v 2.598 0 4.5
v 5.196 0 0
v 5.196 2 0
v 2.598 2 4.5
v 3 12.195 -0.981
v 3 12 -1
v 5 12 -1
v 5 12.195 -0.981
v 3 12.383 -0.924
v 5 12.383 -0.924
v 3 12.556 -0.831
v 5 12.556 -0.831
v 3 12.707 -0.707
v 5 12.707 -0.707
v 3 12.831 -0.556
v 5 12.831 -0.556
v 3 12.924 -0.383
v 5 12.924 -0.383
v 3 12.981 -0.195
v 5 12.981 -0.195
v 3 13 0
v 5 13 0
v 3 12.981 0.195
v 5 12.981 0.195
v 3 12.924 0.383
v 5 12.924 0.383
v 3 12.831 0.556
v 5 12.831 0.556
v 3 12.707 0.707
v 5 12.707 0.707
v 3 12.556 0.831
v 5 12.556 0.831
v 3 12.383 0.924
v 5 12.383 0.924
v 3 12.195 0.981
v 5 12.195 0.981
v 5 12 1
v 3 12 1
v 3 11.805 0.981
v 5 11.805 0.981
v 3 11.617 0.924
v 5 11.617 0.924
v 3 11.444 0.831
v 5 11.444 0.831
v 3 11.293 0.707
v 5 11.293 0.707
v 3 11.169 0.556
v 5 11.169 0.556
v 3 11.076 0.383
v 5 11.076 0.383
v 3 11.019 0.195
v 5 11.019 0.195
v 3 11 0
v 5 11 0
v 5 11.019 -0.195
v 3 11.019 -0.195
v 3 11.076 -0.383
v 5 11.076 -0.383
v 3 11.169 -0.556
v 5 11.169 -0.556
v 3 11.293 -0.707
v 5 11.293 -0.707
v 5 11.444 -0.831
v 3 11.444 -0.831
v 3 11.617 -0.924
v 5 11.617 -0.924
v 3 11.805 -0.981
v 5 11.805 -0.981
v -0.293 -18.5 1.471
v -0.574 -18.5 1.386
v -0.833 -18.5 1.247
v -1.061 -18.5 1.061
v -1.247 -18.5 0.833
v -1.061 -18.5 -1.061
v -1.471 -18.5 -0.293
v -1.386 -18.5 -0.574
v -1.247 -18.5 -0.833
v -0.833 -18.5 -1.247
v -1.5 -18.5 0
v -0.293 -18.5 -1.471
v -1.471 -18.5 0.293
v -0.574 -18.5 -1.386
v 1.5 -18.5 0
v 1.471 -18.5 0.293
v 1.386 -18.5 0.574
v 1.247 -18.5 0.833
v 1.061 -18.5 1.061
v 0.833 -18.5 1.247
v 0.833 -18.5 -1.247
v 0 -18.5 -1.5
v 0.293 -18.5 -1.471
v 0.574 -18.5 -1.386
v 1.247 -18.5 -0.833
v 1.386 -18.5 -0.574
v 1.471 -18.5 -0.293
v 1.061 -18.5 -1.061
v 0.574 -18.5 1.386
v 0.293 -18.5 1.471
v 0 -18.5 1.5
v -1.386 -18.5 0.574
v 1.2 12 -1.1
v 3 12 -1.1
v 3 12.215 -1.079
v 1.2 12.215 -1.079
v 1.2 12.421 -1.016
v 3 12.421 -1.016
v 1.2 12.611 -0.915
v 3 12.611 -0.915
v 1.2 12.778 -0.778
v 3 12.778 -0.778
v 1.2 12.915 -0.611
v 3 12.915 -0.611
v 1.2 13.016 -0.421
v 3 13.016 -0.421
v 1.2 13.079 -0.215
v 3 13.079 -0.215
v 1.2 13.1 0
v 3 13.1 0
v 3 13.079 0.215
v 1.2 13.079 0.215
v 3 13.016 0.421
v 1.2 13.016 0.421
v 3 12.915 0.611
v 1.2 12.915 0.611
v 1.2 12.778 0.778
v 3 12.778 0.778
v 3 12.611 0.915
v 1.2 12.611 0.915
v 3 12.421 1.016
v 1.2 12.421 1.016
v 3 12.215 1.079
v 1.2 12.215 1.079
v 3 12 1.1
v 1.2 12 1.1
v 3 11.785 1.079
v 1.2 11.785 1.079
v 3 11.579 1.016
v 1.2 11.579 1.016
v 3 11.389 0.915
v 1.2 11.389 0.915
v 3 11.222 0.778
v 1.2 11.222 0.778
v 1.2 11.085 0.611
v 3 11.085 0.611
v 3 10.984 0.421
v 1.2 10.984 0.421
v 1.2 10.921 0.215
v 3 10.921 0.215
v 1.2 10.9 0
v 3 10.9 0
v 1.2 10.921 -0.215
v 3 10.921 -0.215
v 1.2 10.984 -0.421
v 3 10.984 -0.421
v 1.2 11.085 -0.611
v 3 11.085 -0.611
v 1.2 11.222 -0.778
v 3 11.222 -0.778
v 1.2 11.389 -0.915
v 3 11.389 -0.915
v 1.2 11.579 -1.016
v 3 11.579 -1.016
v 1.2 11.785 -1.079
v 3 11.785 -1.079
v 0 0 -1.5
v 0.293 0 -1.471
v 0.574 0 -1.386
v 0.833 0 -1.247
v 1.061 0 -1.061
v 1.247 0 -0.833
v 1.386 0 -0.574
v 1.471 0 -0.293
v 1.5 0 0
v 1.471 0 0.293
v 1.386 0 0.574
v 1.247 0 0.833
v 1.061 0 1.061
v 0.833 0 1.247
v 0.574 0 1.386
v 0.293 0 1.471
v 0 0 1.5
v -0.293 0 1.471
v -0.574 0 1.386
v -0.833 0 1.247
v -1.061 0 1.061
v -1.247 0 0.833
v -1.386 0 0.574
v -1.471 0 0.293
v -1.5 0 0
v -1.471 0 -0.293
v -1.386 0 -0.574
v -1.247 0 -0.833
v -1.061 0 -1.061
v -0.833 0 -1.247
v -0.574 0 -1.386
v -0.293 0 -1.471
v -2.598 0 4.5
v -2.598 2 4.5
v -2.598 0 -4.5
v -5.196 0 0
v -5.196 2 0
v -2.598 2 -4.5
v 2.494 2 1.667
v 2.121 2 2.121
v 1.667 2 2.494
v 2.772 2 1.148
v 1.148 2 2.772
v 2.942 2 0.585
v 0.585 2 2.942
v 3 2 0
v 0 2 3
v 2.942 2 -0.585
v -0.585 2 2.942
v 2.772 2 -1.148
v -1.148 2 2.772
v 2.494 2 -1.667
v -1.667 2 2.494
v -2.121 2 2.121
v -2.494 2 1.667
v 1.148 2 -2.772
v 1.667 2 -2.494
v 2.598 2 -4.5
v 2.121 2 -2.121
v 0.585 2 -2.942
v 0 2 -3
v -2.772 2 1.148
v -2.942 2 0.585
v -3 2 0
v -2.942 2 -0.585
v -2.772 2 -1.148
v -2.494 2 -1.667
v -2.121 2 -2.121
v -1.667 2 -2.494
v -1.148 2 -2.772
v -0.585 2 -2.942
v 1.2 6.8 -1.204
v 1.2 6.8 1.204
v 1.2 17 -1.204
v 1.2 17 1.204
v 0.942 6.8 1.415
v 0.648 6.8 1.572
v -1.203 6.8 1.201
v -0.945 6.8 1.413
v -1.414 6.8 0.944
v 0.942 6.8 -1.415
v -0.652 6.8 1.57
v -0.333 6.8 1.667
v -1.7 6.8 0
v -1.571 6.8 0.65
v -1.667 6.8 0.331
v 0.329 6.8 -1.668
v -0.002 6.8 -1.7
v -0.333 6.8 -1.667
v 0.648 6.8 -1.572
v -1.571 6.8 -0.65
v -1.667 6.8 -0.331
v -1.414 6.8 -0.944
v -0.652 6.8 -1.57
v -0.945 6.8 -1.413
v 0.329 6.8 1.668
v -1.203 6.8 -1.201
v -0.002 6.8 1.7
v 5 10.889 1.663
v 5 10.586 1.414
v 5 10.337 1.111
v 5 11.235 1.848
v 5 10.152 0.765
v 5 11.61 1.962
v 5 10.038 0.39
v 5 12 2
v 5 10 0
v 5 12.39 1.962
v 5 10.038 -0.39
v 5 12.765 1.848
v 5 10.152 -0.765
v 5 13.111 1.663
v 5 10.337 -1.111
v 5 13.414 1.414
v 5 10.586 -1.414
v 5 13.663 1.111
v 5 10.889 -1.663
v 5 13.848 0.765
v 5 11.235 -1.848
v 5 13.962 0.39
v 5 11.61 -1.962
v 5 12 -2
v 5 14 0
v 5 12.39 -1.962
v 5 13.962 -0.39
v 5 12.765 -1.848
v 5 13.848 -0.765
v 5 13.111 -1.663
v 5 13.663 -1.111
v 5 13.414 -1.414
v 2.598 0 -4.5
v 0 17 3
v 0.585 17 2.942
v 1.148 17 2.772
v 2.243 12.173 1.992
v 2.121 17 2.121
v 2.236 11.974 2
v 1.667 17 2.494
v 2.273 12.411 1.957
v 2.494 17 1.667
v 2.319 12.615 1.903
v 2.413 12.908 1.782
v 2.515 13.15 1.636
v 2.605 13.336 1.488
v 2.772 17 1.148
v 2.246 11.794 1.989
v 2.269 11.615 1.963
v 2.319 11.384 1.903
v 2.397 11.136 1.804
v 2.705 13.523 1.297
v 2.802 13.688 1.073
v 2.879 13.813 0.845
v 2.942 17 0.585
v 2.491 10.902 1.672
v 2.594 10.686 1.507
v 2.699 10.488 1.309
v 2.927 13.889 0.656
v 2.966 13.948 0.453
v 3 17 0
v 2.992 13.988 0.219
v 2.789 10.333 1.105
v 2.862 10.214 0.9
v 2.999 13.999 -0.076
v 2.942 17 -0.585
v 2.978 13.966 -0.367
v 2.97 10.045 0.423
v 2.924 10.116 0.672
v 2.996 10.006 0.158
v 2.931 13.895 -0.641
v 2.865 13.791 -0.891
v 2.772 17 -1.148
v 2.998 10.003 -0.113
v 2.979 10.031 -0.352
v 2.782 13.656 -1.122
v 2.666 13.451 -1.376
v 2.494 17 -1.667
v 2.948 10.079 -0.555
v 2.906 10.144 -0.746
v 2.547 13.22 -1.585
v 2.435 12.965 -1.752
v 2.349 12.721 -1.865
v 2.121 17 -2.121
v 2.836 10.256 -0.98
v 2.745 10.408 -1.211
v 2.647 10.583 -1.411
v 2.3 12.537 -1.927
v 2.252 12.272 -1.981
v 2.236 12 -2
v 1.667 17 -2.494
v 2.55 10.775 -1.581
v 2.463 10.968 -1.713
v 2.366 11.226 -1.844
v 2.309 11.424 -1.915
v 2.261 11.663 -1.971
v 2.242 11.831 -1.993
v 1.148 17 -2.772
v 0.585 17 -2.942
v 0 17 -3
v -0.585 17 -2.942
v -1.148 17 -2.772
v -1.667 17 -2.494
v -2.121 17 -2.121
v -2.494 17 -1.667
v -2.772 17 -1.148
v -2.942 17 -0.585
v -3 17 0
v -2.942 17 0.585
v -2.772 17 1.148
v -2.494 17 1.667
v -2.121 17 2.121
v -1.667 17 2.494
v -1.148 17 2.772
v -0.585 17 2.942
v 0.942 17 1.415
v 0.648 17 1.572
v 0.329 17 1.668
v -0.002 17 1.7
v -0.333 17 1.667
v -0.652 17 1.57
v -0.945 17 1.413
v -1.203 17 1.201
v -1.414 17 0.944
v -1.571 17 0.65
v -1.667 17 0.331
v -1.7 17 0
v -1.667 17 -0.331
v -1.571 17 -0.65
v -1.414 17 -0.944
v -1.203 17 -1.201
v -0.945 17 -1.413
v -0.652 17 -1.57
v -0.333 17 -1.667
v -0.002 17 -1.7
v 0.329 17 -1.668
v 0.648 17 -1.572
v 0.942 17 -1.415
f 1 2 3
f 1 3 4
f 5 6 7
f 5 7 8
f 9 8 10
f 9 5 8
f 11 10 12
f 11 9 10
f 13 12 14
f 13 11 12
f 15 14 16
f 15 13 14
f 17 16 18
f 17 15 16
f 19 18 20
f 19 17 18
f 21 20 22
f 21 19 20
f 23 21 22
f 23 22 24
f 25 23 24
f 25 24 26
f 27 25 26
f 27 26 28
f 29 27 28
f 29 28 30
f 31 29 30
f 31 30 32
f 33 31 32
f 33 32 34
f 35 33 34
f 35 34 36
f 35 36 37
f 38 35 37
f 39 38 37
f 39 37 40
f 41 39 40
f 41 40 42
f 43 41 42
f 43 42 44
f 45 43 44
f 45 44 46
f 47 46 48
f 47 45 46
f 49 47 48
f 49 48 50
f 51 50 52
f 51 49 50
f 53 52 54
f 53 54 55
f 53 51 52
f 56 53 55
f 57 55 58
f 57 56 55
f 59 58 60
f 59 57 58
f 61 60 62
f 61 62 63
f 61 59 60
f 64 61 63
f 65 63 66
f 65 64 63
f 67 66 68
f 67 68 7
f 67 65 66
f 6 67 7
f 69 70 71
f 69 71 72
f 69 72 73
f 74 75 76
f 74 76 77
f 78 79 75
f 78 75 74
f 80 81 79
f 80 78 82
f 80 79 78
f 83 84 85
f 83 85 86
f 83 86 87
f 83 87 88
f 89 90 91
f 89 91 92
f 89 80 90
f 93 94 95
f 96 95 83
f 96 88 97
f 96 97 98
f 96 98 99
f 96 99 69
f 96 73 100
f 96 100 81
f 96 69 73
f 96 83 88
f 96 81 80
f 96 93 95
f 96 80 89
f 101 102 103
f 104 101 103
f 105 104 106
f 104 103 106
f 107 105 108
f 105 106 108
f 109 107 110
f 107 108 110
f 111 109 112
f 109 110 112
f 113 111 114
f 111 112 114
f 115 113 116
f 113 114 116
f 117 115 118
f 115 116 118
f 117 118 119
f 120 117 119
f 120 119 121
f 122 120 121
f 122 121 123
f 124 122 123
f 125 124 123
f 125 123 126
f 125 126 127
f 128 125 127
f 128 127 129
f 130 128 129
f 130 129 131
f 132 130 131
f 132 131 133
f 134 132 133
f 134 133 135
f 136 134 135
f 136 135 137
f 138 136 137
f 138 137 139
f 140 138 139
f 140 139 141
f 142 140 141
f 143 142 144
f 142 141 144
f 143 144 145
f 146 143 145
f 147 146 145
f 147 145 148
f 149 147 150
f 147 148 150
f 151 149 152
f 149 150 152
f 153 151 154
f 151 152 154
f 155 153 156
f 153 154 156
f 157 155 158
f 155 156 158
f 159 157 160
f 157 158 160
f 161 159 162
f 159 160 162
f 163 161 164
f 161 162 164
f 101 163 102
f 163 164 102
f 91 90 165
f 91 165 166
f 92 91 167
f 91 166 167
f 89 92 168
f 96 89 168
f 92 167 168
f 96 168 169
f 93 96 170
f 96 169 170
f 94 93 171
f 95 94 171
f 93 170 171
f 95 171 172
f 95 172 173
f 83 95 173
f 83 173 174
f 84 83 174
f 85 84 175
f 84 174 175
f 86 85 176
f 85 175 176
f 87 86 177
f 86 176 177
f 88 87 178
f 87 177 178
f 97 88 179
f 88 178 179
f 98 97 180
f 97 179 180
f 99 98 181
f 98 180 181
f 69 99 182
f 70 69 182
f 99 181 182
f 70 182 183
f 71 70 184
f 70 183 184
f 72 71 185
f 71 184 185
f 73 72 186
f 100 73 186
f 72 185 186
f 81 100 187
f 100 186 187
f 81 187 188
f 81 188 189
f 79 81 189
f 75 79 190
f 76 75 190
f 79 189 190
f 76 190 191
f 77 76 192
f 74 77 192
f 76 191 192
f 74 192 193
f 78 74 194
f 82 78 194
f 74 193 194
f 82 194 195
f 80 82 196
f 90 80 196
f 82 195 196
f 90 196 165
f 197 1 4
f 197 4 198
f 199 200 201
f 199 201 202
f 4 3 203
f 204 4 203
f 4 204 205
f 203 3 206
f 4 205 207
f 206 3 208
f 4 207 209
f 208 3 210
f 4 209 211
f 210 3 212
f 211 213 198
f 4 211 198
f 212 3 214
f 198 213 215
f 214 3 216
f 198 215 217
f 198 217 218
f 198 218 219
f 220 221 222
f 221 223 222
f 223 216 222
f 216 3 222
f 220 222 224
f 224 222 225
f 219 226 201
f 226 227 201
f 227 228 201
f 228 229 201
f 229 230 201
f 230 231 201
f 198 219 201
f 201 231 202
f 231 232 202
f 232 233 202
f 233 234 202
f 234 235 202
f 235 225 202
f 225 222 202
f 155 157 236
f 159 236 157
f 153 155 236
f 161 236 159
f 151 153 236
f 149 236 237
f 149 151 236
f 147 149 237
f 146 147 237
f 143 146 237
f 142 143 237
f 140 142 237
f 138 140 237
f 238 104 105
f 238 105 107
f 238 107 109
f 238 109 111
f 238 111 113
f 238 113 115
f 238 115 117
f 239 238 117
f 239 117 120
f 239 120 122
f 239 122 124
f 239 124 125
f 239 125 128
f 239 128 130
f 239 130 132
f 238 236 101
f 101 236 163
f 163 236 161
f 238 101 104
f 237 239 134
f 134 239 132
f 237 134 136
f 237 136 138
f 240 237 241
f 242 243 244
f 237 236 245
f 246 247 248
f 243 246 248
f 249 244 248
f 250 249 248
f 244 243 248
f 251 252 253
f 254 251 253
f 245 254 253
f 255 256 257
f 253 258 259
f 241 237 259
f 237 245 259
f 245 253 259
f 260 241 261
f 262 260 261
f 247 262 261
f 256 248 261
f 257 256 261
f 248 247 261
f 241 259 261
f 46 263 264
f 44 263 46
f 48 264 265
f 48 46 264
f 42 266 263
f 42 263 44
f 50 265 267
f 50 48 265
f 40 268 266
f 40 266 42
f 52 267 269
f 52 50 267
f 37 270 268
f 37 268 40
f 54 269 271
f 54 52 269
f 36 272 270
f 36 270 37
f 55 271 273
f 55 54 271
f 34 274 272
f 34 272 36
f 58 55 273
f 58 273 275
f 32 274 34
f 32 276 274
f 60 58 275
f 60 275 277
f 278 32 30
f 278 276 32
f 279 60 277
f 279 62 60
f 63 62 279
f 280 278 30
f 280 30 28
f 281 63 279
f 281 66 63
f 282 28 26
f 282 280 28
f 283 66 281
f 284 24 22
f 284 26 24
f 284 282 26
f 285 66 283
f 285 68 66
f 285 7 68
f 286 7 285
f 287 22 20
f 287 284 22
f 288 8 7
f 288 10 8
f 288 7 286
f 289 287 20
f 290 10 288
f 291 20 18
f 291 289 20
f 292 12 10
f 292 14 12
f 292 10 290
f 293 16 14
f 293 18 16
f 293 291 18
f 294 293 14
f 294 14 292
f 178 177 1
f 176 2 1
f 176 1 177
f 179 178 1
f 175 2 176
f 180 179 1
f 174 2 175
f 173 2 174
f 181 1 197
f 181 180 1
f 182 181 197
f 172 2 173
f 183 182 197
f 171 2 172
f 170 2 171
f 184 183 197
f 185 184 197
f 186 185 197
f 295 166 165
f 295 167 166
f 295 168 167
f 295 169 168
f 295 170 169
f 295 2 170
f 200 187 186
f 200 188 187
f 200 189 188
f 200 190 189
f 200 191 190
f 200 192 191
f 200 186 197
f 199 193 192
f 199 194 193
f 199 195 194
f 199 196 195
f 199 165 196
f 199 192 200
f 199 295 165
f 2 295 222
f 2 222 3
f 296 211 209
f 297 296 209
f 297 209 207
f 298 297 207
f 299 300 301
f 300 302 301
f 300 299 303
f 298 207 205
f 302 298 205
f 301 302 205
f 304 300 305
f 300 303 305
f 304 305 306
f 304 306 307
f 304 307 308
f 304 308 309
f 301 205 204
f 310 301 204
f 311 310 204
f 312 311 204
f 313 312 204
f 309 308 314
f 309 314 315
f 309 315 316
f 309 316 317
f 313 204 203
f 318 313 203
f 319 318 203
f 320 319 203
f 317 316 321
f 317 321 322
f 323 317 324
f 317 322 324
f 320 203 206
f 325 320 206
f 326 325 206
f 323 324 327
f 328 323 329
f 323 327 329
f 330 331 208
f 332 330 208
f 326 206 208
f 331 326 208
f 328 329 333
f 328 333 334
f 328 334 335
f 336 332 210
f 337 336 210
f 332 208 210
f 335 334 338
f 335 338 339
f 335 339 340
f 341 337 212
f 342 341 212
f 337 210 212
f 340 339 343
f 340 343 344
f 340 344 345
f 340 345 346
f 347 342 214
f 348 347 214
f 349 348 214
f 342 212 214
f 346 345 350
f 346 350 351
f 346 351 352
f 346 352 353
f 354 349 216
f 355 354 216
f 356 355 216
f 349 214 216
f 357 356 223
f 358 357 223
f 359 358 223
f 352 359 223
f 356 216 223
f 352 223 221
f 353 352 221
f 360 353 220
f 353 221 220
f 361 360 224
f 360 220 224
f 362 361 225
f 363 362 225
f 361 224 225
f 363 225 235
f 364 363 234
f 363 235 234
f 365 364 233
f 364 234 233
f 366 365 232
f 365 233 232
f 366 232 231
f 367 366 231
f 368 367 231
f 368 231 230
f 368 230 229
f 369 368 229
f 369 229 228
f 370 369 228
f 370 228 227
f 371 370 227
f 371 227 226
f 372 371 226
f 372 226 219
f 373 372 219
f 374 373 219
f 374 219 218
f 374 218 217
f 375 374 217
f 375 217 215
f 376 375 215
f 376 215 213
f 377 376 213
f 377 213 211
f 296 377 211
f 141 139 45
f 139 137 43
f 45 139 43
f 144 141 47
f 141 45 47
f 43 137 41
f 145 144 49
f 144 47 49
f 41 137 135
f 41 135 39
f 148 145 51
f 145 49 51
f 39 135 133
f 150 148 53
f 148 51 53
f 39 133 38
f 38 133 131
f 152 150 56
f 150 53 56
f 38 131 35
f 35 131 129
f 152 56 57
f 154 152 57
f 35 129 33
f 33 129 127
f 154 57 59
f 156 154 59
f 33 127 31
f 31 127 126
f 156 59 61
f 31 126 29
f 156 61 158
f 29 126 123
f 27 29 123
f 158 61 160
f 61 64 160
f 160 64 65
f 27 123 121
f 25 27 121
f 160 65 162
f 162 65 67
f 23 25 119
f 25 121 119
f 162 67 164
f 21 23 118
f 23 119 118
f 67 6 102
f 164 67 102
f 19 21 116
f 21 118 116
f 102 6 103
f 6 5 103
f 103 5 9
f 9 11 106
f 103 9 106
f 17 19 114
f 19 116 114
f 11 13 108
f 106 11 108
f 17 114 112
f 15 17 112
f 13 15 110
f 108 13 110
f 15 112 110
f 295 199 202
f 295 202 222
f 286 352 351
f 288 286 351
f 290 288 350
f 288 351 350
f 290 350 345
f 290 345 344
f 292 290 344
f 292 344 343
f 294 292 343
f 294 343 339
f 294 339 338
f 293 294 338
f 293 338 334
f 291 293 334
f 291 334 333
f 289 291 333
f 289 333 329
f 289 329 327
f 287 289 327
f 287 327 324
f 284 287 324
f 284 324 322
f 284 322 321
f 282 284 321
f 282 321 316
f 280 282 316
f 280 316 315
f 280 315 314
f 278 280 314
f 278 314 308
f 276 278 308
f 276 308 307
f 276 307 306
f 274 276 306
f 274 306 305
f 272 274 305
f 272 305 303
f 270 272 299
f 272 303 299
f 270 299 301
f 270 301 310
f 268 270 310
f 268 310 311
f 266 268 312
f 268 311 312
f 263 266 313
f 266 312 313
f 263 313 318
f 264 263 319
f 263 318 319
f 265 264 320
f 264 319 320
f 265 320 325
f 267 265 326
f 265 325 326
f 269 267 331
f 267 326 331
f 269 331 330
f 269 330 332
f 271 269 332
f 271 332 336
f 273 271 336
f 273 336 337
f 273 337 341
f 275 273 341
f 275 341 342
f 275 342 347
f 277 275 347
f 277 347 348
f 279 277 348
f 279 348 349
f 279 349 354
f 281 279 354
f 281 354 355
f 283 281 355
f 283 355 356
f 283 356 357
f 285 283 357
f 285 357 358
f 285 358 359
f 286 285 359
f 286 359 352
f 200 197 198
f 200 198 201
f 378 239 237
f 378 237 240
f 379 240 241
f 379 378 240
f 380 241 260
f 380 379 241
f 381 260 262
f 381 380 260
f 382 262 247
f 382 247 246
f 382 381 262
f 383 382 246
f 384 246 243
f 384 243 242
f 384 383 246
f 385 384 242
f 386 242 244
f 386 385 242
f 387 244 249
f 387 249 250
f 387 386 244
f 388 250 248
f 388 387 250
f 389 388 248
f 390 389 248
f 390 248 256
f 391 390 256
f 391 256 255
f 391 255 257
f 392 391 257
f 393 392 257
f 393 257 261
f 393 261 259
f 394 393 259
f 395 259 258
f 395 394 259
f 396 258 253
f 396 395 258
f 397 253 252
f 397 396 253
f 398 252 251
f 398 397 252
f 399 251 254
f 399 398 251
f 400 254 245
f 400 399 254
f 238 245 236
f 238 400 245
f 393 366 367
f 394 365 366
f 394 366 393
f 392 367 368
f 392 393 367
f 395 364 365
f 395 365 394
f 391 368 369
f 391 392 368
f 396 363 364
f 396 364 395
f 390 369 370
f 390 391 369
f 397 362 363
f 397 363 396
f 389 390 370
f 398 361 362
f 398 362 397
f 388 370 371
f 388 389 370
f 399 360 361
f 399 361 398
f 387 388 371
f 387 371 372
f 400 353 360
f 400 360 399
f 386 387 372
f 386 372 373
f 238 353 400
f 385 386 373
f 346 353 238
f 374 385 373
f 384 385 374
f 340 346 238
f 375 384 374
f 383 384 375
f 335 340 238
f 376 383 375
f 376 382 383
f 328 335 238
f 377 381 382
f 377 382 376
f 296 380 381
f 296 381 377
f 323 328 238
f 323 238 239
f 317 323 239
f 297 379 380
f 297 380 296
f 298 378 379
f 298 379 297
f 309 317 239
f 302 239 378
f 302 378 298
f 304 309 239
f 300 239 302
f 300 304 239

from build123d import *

# Parameters (mm, degrees)
SKETCH1_R                = 3
BOSS_EXTRUDE1_DEPTH      = 17
CUT_EXTRUDE3_DEPTH       = 10.2
BOSS_EXTRUDE2_DEPTH      = 2
SKETCH4_R                = 1.5
BOSS_EXTRUDE3_DEPTH      = 18.5
BOSS_EXTRUDE4_DEPTH      = 2
BOSS_EXTRUDE4_DEPTH_BACK = 1
SKETCH6_R                = 2
SKETCH6_R_2              = 1
SKETCH7_R                = 1.1
CUT_EXTRUDE4_DEPTH       = 3


with BuildPart() as part:
    # Sketch1 → Boss-Extrude1 (new body)
    with BuildSketch(Plane(origin=(0, 0, 0), x_dir=(1, 0, 0), z_dir=(0, 1, 0))):
        with Locations(Location((0, 0, 0), (0, 0, 270))):
            Circle(SKETCH1_R)
    extrude(amount=BOSS_EXTRUDE1_DEPTH)

    # Sketch2 → Cut-Extrude3 (cut)
    with BuildSketch(Plane(origin=(0, 17, 0), x_dir=(1, 0, 0), z_dir=(0, 1, 0))):
        with BuildLine():
            Line((1.2, 1.204159458), (1.2, -1.204159458))
            ThreePointArc((1.2, -1.204159458), (-1.7, 0), (1.2, 1.204159458))
        make_face()
    extrude(amount=-CUT_EXTRUDE3_DEPTH, mode=Mode.SUBTRACT)

    # Sketch3 → Boss-Extrude2 (add)
    with BuildSketch(Plane(origin=(0, 0, 0), x_dir=(-1, 0, 0), z_dir=(0, -1, 0))):
        Polygon((5.196152423, 0), (2.598076211, 4.5), (-2.598076211, 4.5), (-5.196152423, 0), (-2.598076211, -4.5), (2.598076211, -4.5), align=None)
    extrude(amount=-BOSS_EXTRUDE2_DEPTH)

    # Sketch4 → Boss-Extrude3 (add)
    with BuildSketch(Plane(origin=(0, 0, 0), x_dir=(-1, 0, 0), z_dir=(0, -1, 0))):
        with Locations(Location((0, 0, 0), (0, 0, 90))):
            Circle(SKETCH4_R)
    extrude(amount=BOSS_EXTRUDE3_DEPTH)

    # Sketch6 → Boss-Extrude4 (add, two sides: drawn at the far end of the back side and taken through both)
    with BuildSketch(Plane(origin=(3, 0, 0), x_dir=(0, 0, -1), z_dir=(1, 0, 0)).offset(-BOSS_EXTRUDE4_DEPTH_BACK)):
        with Locations((0, 12)):
            Circle(SKETCH6_R)
        with Locations((0, 12)):
            Circle(SKETCH6_R_2, mode=Mode.SUBTRACT)
    extrude(amount=BOSS_EXTRUDE4_DEPTH + BOSS_EXTRUDE4_DEPTH_BACK)

    # Sketch7 → Cut-Extrude4 (cut)
    with BuildSketch(Plane(origin=(3, 0, 0), x_dir=(0, 0, -1), z_dir=(1, 0, 0))):
        with Locations((0, 12)):
            Circle(SKETCH7_R)
    extrude(amount=-CUT_EXTRUDE4_DEPTH, mode=Mode.SUBTRACT)


solid = part.part
